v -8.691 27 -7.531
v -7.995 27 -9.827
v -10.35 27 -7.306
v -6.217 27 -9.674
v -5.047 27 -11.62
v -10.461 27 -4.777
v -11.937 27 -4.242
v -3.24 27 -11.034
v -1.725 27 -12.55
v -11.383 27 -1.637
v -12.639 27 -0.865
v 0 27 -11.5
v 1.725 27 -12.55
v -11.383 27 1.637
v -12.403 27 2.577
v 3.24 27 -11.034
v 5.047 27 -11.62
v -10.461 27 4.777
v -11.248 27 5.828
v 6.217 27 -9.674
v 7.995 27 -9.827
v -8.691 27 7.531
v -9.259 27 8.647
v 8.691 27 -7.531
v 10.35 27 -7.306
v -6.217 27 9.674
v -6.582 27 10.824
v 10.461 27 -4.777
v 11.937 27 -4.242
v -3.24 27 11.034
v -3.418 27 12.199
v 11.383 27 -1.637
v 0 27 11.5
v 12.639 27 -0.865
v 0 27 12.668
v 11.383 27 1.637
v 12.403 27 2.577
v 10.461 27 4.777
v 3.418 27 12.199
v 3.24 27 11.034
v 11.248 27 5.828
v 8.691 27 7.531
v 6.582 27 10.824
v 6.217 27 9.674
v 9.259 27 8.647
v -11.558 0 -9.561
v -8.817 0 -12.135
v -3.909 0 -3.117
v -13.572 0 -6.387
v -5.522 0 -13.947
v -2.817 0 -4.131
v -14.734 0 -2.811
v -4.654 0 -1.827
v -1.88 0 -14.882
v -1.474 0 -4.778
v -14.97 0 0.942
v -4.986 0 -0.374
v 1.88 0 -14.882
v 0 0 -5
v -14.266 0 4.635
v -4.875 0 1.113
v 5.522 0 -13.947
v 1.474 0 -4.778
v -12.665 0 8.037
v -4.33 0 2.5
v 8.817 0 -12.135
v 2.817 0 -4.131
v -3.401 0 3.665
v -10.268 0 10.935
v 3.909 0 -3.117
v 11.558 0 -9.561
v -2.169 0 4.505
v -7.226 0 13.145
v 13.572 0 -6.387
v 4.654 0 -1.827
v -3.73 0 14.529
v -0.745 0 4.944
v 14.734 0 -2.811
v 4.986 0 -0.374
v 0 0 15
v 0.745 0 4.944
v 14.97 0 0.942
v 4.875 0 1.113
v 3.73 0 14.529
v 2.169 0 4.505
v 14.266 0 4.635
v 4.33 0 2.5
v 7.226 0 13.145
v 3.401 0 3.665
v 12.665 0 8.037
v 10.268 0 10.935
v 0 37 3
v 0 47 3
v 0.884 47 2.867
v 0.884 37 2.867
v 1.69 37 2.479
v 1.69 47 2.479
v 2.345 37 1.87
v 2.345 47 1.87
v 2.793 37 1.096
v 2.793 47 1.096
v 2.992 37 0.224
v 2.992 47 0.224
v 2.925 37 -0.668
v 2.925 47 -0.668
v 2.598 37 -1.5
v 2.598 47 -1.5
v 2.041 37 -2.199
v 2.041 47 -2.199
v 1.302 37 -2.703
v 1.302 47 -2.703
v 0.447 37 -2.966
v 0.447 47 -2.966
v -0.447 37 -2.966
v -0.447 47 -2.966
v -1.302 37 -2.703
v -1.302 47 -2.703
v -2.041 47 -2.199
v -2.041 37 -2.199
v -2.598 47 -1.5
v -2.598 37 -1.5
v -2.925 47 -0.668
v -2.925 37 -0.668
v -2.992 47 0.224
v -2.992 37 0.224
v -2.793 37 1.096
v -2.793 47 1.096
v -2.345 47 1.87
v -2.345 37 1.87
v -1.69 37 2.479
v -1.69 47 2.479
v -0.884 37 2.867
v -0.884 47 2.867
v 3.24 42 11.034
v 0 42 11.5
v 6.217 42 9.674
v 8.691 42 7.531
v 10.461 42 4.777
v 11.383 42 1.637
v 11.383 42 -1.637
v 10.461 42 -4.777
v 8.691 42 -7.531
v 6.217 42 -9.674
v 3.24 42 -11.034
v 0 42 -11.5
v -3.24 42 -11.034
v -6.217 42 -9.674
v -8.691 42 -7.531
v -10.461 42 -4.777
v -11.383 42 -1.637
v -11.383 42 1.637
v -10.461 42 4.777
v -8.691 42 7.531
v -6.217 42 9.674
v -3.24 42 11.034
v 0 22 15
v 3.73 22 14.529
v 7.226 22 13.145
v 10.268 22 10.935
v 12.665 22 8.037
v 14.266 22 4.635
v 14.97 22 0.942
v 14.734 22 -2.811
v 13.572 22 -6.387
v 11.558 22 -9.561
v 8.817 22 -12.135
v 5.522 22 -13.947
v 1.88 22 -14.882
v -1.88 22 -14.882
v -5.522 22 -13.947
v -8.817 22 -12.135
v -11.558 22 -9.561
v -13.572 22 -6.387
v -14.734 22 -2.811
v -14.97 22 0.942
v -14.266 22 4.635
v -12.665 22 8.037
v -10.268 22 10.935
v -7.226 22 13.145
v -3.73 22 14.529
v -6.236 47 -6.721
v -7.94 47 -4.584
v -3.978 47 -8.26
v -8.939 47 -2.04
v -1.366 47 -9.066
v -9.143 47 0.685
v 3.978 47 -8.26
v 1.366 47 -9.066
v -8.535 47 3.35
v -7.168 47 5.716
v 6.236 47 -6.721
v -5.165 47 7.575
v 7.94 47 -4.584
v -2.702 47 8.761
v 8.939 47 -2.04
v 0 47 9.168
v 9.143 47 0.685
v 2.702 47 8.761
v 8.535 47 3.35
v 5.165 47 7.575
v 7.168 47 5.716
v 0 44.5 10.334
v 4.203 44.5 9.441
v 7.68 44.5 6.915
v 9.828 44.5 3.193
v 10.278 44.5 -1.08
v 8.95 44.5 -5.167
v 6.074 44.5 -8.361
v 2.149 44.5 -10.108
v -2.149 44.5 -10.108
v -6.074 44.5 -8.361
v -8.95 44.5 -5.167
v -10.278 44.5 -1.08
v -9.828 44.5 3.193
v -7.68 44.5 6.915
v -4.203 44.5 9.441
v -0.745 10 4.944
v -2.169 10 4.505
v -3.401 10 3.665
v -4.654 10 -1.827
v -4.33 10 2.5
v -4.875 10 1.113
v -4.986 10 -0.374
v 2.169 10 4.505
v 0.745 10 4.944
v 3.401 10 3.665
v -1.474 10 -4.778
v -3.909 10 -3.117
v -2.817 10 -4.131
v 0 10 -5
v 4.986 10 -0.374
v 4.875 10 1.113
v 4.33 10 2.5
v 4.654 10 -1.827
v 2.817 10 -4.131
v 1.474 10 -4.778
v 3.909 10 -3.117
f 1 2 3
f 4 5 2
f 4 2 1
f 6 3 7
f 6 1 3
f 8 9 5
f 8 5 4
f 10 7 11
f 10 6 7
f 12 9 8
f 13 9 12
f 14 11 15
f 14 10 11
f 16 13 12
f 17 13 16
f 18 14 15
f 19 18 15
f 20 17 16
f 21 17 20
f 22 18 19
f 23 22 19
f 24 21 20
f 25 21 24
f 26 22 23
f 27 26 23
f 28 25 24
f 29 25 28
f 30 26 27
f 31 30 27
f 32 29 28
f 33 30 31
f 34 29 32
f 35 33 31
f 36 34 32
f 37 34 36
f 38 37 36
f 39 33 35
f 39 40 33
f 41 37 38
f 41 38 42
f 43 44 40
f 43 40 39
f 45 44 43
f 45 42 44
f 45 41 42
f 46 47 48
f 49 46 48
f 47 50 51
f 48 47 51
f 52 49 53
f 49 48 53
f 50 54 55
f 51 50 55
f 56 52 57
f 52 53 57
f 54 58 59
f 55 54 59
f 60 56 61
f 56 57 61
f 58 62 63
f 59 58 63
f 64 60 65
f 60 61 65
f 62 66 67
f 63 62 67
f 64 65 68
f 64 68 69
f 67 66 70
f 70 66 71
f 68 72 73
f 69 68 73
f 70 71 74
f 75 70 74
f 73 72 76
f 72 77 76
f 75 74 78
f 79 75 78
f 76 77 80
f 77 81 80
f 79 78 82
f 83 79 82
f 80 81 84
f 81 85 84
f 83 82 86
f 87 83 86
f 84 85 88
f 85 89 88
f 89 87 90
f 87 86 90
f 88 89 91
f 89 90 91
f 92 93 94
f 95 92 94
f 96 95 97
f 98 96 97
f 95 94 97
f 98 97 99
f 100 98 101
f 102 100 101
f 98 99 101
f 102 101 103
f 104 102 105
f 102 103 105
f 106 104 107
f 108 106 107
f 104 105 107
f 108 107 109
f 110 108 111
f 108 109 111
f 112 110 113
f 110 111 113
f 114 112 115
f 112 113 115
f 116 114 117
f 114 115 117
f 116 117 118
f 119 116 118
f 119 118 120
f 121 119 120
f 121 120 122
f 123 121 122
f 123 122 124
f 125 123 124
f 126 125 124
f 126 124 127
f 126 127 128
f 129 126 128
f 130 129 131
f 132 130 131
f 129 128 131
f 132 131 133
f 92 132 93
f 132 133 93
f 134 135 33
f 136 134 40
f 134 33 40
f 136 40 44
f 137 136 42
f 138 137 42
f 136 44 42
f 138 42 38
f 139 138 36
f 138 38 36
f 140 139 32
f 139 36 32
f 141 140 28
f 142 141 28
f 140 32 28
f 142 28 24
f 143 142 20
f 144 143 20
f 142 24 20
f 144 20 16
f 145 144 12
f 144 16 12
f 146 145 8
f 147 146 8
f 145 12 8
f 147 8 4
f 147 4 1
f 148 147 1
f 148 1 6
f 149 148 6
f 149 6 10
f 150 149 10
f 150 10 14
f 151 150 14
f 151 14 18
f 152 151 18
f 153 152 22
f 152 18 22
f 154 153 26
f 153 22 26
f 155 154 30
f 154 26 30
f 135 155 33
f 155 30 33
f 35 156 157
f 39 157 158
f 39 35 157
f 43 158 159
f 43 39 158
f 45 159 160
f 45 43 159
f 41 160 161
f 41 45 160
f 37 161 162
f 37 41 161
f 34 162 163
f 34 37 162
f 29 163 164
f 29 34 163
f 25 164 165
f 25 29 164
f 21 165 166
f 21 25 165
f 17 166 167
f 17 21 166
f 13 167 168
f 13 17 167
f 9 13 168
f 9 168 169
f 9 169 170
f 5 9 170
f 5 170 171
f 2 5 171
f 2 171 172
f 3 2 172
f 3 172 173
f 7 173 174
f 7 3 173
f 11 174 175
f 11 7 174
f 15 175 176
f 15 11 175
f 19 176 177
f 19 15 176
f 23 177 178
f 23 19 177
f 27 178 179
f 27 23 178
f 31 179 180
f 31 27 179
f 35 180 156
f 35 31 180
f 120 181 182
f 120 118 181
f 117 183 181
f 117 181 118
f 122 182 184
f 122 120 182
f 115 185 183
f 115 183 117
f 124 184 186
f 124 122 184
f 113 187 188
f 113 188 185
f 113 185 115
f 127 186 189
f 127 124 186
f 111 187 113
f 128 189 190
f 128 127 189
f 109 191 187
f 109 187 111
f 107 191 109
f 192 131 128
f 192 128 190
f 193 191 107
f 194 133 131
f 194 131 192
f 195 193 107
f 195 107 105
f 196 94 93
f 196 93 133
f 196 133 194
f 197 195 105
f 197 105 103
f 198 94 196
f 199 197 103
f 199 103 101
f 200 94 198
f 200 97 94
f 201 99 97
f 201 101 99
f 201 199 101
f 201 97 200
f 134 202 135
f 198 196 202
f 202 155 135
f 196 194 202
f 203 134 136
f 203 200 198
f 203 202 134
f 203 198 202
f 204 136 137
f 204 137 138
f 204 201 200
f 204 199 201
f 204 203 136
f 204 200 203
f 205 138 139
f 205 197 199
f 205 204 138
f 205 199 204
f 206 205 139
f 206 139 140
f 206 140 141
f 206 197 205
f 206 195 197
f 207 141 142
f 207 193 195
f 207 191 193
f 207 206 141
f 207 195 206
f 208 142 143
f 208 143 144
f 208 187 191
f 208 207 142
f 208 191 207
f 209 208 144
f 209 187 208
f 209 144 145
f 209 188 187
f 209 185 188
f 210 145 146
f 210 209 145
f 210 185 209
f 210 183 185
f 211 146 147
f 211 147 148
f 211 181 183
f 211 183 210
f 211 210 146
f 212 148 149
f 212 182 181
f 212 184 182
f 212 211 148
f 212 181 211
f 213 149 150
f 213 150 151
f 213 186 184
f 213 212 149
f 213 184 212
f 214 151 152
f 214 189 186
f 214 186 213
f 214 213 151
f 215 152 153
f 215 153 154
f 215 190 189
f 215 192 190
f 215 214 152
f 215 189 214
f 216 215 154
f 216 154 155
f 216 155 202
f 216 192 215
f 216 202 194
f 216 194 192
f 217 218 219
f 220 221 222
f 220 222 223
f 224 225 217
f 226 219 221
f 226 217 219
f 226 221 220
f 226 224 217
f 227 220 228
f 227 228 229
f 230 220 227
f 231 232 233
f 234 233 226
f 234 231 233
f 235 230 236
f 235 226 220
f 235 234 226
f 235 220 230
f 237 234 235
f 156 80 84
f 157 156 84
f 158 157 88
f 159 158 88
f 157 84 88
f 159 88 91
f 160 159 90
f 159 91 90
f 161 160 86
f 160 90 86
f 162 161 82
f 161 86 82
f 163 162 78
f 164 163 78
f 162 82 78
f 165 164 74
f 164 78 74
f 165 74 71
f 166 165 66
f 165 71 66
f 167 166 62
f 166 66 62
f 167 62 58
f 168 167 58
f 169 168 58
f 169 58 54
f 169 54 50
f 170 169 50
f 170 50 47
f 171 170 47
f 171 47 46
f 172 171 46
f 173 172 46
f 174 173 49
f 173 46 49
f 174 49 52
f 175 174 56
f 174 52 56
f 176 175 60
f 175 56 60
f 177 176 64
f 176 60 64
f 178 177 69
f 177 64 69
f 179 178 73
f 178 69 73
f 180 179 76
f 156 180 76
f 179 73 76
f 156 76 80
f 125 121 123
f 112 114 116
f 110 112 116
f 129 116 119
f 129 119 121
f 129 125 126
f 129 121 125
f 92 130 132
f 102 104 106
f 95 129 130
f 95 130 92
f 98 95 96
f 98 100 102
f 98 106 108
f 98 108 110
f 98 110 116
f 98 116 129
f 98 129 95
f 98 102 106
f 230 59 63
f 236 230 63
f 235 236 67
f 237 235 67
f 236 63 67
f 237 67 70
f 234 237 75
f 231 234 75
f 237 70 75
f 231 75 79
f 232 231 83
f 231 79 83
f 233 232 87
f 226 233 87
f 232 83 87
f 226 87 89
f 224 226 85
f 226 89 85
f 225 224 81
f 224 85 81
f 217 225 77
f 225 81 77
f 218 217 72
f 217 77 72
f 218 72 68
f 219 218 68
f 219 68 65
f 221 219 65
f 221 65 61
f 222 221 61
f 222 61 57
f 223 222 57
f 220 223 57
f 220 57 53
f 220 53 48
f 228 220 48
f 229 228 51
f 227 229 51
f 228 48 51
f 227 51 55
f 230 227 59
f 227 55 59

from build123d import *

# Parameters (mm, degrees)
CROQUIS1_R              = 15
SALIENTE_EXTRUIR1_DEPTH = 27
CROQUIS2_R              = 11.5
SALIENTE_EXTRUIR2_DEPTH = 20
CHAFL_N1_SIZE           = 5
CHAFL_N1_SIZE2          = 2.331538291
CHAFL_N2_SIZE           = 5
CHAFL_N2_SIZE2          = 2.331538291
CROQUIS3_R              = 5
CORTAR_EXTRUIR1_DEPTH   = 10
CROQUIS4_R              = 3
CORTAR_EXTRUIR2_DEPTH   = 10


with BuildPart() as part:
    # Croquis1 → Saliente-Extruir1 (new body)
    with BuildSketch(Plane(origin=(0, 0, 0), x_dir=(1, 0, 0), z_dir=(0, 1, 0))):
        with Locations(Location((0, 0, 0), (0, 0, 270))):
            Circle(CROQUIS1_R)
    extrude(amount=SALIENTE_EXTRUIR1_DEPTH)

    # Croquis2 → Saliente-Extruir2 (add)
    with BuildSketch(Plane(origin=(0, 27, 0), x_dir=(1, 0, 0), z_dir=(0, 1, 0))):
        with Locations(Location((0, 0, 0), (0, 0, 270))):
            Circle(CROQUIS2_R)
    extrude(amount=SALIENTE_EXTRUIR2_DEPTH)

    # Chaflán1
    chafl_n1_edges = [part.edges().sort_by_distance(p)[0] for p in [
        (0, 47, -11.5),
    ]]
    chafl_n1_side = [part.faces().sort_by_distance(p)[0] for p in [
        (0, 37, -11.5),
    ]]
    chamfer(chafl_n1_edges, length=CHAFL_N1_SIZE, length2=CHAFL_N1_SIZE2, reference=chafl_n1_side[0])

    # Chaflán2
    chafl_n2_edges = [part.edges().sort_by_distance(p)[0] for p in [
        (0, 27, -15),
    ]]
    chafl_n2_side = [part.faces().sort_by_distance(p)[0] for p in [
        (0, 13.5, -15),
    ]]
    chamfer(chafl_n2_edges, length=CHAFL_N2_SIZE, length2=CHAFL_N2_SIZE2, reference=chafl_n2_side[0])

    # Croquis3 → Cortar-Extruir1 (cut)
    with BuildSketch(Plane(origin=(0, 0, 0), x_dir=(-1, 0, 0), z_dir=(0, -1, 0))):
        with Locations(Location((0, 0, 0), (0, 0, 90))):
            Circle(CROQUIS3_R)
    extrude(amount=-CORTAR_EXTRUIR1_DEPTH, mode=Mode.SUBTRACT)

    # Croquis4 → Cortar-Extruir2 (cut)
    with BuildSketch(Plane(origin=(0, 47, 0), x_dir=(1, 0, 0), z_dir=(0, 1, 0))):
        with Locations(Location((0, 0, 0), (0, 0, 270))):
            Circle(CROQUIS4_R)
    extrude(amount=-CORTAR_EXTRUIR2_DEPTH, mode=Mode.SUBTRACT)


solid = part.part
